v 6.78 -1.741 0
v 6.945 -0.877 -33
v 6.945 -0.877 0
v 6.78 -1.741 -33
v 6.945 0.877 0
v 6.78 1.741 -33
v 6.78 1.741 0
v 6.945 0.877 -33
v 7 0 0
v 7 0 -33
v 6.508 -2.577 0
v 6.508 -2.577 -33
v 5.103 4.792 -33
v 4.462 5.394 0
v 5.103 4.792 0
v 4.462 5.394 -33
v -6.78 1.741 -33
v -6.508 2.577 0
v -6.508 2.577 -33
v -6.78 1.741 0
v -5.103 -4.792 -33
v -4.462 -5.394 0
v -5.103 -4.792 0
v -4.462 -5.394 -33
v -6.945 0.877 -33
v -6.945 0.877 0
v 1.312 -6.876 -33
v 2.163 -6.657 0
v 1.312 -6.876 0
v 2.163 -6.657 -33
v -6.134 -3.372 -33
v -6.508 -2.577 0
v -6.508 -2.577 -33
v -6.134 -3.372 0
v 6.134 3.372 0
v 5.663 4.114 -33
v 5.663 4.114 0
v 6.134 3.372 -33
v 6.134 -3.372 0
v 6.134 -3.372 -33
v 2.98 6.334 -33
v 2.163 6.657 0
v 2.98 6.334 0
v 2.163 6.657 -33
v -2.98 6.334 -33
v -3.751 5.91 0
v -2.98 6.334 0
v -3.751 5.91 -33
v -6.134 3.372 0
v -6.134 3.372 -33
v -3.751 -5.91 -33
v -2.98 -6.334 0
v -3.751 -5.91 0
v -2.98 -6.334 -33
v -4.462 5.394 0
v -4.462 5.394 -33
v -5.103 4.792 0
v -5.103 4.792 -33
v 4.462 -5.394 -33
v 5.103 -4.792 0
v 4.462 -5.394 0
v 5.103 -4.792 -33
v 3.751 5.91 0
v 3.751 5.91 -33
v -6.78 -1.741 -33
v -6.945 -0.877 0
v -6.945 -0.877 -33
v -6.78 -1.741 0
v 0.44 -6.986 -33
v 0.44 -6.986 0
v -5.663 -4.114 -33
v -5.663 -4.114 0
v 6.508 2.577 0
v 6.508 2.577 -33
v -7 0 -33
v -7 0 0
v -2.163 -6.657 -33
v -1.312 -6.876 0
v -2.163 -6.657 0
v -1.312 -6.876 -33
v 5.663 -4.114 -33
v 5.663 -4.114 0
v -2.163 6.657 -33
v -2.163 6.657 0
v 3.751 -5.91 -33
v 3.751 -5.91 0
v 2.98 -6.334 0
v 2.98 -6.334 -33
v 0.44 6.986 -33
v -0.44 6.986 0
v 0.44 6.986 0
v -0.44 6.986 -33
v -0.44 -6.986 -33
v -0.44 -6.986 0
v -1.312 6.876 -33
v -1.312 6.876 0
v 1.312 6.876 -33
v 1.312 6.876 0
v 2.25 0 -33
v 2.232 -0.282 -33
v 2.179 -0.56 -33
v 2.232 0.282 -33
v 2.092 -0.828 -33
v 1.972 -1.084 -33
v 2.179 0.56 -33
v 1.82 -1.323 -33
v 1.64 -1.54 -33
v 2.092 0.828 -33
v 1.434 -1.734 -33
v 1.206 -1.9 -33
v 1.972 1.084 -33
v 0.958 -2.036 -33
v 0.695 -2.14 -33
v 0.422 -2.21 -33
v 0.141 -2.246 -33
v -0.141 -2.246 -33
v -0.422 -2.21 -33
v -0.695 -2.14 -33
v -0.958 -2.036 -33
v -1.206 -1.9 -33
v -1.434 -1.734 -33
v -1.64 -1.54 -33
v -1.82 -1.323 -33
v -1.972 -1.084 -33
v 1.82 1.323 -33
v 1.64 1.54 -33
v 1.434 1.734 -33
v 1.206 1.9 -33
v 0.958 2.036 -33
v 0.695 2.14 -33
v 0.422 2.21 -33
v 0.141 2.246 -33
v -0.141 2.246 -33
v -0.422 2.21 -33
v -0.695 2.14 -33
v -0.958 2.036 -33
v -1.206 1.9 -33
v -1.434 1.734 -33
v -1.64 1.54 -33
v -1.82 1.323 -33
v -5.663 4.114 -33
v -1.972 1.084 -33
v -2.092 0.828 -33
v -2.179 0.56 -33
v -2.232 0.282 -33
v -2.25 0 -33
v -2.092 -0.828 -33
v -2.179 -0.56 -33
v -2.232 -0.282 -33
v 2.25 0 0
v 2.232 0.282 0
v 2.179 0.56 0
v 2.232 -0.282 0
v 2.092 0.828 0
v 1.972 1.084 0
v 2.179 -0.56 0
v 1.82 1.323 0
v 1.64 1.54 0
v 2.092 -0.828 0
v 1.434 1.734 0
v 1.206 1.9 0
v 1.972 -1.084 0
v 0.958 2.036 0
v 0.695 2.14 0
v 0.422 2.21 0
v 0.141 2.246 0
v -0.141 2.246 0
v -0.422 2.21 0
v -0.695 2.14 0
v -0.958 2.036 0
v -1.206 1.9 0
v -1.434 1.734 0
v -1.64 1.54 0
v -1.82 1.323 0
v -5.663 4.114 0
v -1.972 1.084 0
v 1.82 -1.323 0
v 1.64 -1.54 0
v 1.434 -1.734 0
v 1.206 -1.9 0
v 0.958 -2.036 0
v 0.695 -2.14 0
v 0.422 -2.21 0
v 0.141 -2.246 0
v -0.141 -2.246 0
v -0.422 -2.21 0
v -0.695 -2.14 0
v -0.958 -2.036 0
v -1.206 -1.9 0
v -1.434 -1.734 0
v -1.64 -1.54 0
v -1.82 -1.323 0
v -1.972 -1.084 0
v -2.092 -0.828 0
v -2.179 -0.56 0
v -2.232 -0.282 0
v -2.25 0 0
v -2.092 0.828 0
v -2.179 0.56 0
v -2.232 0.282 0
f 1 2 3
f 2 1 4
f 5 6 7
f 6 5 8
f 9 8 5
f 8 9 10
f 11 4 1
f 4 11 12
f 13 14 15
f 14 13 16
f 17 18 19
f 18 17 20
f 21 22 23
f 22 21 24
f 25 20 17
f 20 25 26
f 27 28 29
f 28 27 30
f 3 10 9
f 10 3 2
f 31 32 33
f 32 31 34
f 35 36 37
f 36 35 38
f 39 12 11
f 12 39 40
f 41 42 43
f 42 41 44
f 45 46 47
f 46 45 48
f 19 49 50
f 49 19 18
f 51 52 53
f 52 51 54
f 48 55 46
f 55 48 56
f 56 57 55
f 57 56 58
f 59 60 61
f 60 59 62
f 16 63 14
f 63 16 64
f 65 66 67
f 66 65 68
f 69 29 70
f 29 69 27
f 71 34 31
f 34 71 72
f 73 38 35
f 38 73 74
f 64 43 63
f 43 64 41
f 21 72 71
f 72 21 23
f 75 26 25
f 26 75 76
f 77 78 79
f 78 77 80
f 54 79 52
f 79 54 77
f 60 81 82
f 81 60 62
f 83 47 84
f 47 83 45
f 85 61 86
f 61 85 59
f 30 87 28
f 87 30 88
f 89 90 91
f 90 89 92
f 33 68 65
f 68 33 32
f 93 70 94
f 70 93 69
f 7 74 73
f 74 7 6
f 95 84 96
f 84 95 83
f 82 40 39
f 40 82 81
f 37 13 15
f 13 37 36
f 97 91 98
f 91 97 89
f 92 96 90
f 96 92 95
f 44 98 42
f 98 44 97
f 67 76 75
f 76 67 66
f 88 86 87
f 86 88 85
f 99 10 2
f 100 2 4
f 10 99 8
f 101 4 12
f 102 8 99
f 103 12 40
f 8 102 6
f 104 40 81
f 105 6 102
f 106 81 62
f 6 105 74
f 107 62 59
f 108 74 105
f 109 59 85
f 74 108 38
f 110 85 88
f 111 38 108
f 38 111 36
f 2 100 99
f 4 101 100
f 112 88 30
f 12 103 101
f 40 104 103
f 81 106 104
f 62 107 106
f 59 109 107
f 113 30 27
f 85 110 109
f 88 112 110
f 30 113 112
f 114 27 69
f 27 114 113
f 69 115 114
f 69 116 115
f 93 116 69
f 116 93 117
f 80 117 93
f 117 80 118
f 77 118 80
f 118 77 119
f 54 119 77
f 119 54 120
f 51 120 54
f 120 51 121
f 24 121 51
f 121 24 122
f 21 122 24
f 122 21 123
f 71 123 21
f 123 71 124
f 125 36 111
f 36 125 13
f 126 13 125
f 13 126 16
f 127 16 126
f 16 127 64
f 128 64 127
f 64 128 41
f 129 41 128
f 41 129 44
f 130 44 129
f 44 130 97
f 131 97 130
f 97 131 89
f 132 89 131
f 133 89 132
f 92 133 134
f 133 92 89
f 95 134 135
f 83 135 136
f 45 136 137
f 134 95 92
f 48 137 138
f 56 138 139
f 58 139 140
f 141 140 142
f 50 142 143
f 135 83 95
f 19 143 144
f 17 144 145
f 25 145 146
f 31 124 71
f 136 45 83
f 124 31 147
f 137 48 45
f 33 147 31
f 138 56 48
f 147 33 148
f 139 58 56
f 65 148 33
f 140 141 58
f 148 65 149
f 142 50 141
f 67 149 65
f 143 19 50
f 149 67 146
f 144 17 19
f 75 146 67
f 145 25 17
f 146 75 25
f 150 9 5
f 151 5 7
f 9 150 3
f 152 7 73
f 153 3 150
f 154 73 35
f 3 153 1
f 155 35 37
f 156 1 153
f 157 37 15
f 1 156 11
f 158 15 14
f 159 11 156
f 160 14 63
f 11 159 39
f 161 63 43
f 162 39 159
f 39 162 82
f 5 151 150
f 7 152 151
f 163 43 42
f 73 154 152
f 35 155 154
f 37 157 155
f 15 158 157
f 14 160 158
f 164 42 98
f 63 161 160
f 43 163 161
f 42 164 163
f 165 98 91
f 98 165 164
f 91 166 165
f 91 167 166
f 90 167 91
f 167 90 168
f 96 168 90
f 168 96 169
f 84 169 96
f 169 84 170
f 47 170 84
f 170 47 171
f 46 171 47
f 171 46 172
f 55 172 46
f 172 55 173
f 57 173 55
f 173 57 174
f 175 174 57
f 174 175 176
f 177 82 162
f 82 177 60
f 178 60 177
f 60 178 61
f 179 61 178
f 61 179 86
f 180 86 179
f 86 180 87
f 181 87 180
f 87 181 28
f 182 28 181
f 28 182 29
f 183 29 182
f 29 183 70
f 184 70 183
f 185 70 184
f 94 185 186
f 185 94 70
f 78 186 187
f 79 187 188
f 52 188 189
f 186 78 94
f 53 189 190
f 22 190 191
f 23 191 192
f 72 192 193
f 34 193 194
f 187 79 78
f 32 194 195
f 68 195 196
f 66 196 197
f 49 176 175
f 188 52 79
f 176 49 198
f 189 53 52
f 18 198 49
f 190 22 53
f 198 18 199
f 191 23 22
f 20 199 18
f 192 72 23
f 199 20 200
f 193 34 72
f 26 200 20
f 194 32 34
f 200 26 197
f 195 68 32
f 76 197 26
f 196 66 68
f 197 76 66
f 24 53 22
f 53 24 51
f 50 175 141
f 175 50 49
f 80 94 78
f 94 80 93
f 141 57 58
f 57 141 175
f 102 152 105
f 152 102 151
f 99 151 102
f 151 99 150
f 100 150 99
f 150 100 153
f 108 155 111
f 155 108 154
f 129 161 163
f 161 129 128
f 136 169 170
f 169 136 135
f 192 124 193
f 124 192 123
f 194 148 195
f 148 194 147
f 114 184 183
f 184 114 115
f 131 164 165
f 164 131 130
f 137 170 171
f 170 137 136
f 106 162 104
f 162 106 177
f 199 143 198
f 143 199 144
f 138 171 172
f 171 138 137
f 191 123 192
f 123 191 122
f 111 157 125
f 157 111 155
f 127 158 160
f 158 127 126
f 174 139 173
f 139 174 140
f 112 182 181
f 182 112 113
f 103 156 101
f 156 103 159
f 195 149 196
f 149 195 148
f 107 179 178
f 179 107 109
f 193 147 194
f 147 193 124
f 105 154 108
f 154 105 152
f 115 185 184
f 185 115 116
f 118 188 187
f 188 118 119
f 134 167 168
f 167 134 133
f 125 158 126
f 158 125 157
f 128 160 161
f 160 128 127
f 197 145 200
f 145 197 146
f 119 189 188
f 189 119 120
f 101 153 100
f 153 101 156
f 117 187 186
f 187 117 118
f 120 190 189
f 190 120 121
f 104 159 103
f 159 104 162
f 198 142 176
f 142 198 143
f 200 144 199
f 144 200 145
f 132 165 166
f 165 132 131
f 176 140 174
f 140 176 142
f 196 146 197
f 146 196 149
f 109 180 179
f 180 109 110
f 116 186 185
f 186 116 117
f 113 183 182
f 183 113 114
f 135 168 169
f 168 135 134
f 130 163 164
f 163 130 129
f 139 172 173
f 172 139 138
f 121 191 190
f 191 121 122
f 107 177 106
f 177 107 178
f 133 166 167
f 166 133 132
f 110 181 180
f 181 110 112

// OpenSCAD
$fn = 50;


difference() {
	union() {
		translate(v = [0, 0, -33.0000000000]) {
			cylinder(h = 33, r = 7.0000000000);
		}
		cylinder(h = 0, r = 17.0000000000);
	}
	union() {
		#translate(v = [0, 0, -33]) {
			cylinder(h = 33, r = 2.2500000000);
		}
	}
}
